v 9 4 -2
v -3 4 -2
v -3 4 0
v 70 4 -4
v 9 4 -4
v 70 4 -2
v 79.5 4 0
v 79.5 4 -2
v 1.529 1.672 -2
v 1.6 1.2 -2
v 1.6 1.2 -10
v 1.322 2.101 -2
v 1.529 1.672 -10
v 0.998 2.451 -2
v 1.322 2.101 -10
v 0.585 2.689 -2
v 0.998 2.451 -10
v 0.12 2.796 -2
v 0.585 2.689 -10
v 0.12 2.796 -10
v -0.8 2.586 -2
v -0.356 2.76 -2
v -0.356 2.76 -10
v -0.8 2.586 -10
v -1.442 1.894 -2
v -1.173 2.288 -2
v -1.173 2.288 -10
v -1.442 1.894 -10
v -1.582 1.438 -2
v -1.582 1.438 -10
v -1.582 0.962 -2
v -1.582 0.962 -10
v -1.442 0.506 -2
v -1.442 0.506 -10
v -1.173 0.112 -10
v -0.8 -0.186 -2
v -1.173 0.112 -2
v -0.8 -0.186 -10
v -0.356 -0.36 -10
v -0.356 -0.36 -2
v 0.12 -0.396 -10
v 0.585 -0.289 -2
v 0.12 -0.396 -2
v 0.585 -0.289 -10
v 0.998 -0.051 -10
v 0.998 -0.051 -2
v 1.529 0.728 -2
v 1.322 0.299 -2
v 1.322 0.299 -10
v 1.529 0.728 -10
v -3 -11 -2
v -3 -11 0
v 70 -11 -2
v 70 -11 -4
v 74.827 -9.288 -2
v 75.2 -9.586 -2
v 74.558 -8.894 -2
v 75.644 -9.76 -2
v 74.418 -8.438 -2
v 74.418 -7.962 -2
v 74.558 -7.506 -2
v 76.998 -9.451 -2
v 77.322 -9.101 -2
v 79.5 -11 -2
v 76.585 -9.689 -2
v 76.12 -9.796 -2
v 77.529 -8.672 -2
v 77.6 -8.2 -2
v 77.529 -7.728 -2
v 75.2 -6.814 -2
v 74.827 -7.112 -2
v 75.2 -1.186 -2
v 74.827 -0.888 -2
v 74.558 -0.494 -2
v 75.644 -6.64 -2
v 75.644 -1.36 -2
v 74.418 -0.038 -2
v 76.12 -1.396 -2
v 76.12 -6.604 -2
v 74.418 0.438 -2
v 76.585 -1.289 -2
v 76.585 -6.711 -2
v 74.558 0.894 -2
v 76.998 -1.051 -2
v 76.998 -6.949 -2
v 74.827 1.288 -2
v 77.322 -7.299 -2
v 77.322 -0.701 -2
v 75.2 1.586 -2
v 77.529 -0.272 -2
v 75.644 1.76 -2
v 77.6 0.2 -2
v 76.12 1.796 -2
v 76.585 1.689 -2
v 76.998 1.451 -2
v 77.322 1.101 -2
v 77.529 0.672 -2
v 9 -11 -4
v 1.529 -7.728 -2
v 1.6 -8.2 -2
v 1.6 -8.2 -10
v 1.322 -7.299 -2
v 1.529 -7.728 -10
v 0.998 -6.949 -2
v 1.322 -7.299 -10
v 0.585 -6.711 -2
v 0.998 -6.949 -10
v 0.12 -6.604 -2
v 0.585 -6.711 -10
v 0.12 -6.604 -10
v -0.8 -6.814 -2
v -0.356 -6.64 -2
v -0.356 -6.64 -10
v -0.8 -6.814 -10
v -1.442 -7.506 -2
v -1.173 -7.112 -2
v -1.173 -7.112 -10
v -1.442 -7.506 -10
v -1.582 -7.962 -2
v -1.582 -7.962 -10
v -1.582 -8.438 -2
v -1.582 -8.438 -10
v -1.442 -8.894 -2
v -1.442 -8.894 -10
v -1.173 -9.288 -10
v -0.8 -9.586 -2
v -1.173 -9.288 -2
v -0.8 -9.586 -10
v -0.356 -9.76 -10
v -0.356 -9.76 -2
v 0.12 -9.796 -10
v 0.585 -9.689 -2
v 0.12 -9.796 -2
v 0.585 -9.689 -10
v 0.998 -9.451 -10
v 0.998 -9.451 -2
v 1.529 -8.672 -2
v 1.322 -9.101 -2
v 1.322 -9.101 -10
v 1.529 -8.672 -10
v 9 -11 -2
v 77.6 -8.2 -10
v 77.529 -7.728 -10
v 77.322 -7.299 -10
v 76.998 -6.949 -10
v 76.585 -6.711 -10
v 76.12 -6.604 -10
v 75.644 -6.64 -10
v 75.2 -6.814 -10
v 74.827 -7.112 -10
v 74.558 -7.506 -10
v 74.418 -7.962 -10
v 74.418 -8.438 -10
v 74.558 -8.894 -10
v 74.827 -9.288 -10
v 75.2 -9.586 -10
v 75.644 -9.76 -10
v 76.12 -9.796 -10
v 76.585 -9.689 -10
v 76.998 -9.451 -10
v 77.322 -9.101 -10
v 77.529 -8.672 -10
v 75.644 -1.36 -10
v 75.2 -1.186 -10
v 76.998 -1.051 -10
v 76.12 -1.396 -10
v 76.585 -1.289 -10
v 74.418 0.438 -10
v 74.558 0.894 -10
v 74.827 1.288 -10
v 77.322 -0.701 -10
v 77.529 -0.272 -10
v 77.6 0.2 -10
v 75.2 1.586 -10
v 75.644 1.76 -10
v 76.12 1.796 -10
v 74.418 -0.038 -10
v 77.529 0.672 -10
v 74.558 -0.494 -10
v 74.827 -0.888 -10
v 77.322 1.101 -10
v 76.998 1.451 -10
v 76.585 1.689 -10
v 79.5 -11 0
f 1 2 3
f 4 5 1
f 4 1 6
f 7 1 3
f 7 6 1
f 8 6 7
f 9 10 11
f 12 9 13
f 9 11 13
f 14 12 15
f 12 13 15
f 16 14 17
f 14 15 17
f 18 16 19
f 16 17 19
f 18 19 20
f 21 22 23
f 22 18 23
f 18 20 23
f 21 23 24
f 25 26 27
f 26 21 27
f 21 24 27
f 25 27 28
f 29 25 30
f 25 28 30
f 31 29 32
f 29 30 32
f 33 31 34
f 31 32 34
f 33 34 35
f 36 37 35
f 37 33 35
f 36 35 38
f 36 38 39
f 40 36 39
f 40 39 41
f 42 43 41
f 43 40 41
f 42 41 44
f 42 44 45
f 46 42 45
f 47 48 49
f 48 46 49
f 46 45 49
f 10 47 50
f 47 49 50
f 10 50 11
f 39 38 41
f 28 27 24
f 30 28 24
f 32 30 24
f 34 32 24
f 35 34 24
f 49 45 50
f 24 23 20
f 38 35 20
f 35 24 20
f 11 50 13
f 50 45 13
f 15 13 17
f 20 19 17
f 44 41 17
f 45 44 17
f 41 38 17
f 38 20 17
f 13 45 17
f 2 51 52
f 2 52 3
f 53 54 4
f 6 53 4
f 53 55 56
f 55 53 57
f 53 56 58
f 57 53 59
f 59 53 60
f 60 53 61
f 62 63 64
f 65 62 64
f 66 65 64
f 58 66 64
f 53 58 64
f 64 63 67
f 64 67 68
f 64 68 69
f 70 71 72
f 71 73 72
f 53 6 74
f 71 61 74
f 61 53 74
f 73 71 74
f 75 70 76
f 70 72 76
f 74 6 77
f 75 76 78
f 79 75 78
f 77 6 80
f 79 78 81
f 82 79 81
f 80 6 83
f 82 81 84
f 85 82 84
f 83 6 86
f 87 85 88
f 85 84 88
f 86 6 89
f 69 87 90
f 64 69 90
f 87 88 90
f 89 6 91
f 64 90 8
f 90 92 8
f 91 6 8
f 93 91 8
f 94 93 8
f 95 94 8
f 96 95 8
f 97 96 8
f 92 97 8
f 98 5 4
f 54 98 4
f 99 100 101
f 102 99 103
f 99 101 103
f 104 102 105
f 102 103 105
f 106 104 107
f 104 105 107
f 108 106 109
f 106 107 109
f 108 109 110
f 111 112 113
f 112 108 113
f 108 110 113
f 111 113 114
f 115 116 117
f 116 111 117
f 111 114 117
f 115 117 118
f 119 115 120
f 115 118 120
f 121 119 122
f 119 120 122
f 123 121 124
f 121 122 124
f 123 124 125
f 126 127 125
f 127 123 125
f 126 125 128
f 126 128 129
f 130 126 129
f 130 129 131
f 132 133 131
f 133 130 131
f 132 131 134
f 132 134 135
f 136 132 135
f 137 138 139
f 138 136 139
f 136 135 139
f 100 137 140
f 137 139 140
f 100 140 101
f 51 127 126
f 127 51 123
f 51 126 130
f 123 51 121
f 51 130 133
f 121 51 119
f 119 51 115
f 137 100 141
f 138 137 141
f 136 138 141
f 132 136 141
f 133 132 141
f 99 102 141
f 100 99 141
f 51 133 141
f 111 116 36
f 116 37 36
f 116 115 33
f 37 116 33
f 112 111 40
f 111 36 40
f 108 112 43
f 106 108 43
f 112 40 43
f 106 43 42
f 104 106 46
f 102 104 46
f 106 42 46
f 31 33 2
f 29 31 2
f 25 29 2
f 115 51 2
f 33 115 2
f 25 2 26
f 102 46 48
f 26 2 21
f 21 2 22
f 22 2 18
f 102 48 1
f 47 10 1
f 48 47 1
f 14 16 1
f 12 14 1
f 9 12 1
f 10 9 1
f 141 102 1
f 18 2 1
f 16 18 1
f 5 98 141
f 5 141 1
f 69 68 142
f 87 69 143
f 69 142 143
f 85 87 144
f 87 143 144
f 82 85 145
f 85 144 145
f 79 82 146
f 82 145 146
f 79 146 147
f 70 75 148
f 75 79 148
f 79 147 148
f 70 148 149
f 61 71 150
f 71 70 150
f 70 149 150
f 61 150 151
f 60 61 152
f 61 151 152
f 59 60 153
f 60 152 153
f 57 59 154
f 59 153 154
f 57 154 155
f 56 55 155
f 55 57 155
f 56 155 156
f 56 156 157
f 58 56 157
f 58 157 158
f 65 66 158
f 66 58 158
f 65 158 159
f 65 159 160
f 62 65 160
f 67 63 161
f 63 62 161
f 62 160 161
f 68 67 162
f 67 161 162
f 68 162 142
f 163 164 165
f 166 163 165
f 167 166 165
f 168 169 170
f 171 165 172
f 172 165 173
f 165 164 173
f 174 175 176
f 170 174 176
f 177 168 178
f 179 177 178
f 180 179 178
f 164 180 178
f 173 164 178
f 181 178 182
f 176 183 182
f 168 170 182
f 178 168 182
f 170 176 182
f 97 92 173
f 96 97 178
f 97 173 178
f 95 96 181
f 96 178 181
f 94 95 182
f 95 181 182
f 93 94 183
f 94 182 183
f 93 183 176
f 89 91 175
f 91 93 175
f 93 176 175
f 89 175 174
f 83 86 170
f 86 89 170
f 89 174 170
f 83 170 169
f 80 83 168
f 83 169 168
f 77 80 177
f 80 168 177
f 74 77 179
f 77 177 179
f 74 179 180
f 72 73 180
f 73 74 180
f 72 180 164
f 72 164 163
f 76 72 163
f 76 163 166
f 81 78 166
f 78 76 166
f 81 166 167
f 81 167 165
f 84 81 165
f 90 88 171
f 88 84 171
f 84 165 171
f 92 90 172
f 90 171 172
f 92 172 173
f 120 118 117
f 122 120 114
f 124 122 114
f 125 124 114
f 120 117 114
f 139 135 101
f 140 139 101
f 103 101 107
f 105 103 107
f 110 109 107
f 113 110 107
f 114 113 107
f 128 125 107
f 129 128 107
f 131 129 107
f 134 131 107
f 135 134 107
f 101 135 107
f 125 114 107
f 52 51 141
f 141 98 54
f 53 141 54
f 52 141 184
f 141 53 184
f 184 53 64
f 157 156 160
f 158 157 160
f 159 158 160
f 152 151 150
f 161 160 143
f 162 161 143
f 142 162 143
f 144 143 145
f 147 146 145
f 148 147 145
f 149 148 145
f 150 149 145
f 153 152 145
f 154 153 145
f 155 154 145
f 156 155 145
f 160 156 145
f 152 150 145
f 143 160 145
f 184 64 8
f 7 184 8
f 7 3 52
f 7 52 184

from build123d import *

# Parameters (mm, degrees)
CYLINDER_R        = 1.6
CYLINDER_DEPTH    = 10
BOX001_W          = 61
BOX001_H          = 15
BOX001_DEPTH      = 2
BOX_W             = 82.5
BOX_H             = 15
BOX_DEPTH         = 2
CYLINDER003_R     = 1.6
CYLINDER003_DEPTH = 10
CYLINDER002_R     = 1.6
CYLINDER002_DEPTH = 10
CYLINDER001_R     = 1.6
CYLINDER001_DEPTH = 10


with BuildPart() as taladro1:
    # Cylinder → Cylinder (new body)
    with BuildSketch(Plane(origin=(0, 1.2, -10), x_dir=(1, 0, 0), z_dir=(0, 0, 1))):
        Circle(CYLINDER_R)
    extrude(amount=CYLINDER_DEPTH)


with BuildPart() as perfora_2mm_centro:
    # Box001 → Box001 (new body)
    with BuildSketch(Plane(origin=(12, 0, -2), x_dir=(1, 0, 0), z_dir=(0, 0, 1))):
        with Locations((30.5, 7.5)):
            Rectangle(BOX001_W, BOX001_H)
    extrude(amount=BOX001_DEPTH)


with BuildPart() as fusion001:
    # Box → Box (new body)
    with BuildSketch(Plane.XY):
        with Locations((41.25, 7.5)):
            Rectangle(BOX_W, BOX_H)
    extrude(amount=BOX_DEPTH)

    # Fusion: union perfora_2mm_centro
    add(perfora_2mm_centro.part)


with BuildPart() as fusion001_1:
    # Fusion placement: moved
    add(fusion001.part.moved(Location((-3, -11, -2))))

    # Fusion001: union taladro1
    add(taladro1.part)


with BuildPart() as fusion002:
    # Cylinder003 → Cylinder003 (new body)
    with BuildSketch(Plane(origin=(76, 0.2, -10), x_dir=(1, 0, 0), z_dir=(0, 0, 1))):
        Circle(CYLINDER003_R)
    extrude(amount=CYLINDER003_DEPTH)

    # Fusion002: union Fusion001
    add(fusion001_1.part)


with BuildPart() as fusion003:
    # Cylinder002 → Cylinder002 (new body)
    with BuildSketch(Plane(origin=(76, -8.2, -10), x_dir=(1, 0, 0), z_dir=(0, 0, 1))):
        Circle(CYLINDER002_R)
    extrude(amount=CYLINDER002_DEPTH)

    # Fusion003: union Fusion002
    add(fusion002.part)


with BuildPart() as fusion008:
    # Cylinder001 → Cylinder001 (new body)
    with BuildSketch(Plane(origin=(0, -8.2, -10), x_dir=(1, 0, 0), z_dir=(0, 0, 1))):
        Circle(CYLINDER001_R)
    extrude(amount=CYLINDER001_DEPTH)

    # Fusion008: union Fusion003
    add(fusion003.part)


solid = fusion008.part
